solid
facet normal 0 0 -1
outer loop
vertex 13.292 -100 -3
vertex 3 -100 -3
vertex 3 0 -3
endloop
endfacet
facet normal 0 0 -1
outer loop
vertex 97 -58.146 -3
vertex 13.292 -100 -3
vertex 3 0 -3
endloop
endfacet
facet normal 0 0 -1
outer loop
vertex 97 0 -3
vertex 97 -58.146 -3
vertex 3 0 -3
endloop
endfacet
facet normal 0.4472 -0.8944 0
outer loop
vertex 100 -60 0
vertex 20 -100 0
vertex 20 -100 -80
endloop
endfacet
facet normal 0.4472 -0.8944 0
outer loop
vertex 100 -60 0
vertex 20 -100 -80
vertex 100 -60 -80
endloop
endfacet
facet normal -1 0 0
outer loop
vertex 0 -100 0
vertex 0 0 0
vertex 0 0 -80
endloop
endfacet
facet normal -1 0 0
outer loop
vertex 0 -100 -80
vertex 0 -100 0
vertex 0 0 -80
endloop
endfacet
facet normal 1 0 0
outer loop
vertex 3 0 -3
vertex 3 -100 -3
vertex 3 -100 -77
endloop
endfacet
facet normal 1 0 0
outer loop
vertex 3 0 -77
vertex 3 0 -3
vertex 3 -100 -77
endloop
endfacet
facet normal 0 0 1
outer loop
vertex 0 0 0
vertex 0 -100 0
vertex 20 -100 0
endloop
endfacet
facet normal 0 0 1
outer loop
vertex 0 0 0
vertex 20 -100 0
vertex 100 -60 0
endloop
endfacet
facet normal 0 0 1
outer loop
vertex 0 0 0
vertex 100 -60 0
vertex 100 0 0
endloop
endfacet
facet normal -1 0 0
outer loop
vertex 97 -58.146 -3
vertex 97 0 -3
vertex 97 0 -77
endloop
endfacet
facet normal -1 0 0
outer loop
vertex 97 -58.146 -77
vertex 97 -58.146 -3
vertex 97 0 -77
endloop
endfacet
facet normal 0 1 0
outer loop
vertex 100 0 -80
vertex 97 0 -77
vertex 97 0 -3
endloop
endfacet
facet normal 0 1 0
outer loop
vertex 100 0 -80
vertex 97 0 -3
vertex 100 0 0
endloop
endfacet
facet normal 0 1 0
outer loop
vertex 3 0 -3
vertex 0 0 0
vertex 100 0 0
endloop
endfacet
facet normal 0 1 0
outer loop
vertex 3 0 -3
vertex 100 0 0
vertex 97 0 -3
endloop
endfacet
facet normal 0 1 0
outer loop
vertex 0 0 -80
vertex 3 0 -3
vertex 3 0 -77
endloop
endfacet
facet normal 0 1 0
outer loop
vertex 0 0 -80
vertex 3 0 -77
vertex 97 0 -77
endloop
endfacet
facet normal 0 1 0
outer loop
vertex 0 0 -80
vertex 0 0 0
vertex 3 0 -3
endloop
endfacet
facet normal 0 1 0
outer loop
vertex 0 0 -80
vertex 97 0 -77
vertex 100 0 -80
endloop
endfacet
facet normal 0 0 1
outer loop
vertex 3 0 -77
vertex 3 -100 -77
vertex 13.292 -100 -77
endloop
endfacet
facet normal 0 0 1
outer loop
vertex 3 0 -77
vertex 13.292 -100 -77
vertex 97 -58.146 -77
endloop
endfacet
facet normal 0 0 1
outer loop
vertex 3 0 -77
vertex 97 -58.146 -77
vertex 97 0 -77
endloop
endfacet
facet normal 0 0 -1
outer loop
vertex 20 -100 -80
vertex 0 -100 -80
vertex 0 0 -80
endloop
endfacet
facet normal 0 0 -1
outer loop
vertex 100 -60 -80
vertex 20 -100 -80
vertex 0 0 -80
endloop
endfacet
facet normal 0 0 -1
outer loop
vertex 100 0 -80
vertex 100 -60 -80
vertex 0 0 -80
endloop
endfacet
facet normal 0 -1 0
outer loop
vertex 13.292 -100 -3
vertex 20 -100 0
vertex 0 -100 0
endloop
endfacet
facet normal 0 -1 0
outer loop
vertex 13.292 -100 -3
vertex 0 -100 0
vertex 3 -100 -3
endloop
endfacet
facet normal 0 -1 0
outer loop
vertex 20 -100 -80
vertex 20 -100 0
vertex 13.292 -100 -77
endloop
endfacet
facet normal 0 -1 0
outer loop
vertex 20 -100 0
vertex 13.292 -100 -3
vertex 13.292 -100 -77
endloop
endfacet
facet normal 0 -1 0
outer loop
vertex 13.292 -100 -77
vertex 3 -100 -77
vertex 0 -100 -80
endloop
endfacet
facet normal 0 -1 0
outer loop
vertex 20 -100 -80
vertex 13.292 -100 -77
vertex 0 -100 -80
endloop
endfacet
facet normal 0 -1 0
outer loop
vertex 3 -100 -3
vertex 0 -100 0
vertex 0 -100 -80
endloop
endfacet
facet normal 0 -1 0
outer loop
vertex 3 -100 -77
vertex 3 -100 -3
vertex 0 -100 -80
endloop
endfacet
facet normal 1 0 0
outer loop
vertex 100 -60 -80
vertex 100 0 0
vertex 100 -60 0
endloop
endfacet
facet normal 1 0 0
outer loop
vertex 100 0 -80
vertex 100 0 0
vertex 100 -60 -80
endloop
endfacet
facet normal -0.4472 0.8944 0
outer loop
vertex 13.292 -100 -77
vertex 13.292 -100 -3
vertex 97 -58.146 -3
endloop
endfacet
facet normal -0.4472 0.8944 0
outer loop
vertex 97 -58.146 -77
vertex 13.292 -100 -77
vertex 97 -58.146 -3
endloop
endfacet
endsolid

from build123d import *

# Parameters (mm, degrees)
SKETCH_2_W        = 80
SKETCH_2_H        = 100
EXTRUDE_1_DEPTH   = 100
OTHER_START       = 98.38699101
OTHER_1_OUTLINE_W = 92
OTHER_1_OUTLINE_H = 80
OTHER_1_DEPTH     = 35.77708764
SHELL_3_T         = -3


with BuildPart() as part:
    # 草图2 → 凸台-拉伸1 (new body)
    with BuildSketch(Plane(origin=(0, 0, 0), x_dir=(0, 0, -1), z_dir=(1, 0, 0))):
        with Locations((40, -50)):
            Rectangle(SKETCH_2_W, SKETCH_2_H)
    extrude(amount=EXTRUDE_1_DEPTH)

    # 边界-切除1: read off the stored shape, not the designer's step
    # 边界-切除1 outline → 边界-切除1 (cut)
    with BuildSketch(Plane(origin=(0, 0, 0), x_dir=(0.8944271909999159, 0.44721359549995804, 0), z_dir=(0.447213595499958, -0.894427190999916, 0)).offset(OTHER_START)):
        with Locations((18, -40)):
            Rectangle(OTHER_1_OUTLINE_W, OTHER_1_OUTLINE_H)
    extrude(amount=OTHER_1_DEPTH, mode=Mode.SUBTRACT)

    # 抽壳3
    shell_3_openings = [part.faces().sort_by_distance(p)[0] for p in [
        (10, -100, -40),
        (50, 0, -40),
    ]]
    offset(amount=SHELL_3_T, openings=shell_3_openings, kind=Kind.INTERSECTION)


solid = part.part
